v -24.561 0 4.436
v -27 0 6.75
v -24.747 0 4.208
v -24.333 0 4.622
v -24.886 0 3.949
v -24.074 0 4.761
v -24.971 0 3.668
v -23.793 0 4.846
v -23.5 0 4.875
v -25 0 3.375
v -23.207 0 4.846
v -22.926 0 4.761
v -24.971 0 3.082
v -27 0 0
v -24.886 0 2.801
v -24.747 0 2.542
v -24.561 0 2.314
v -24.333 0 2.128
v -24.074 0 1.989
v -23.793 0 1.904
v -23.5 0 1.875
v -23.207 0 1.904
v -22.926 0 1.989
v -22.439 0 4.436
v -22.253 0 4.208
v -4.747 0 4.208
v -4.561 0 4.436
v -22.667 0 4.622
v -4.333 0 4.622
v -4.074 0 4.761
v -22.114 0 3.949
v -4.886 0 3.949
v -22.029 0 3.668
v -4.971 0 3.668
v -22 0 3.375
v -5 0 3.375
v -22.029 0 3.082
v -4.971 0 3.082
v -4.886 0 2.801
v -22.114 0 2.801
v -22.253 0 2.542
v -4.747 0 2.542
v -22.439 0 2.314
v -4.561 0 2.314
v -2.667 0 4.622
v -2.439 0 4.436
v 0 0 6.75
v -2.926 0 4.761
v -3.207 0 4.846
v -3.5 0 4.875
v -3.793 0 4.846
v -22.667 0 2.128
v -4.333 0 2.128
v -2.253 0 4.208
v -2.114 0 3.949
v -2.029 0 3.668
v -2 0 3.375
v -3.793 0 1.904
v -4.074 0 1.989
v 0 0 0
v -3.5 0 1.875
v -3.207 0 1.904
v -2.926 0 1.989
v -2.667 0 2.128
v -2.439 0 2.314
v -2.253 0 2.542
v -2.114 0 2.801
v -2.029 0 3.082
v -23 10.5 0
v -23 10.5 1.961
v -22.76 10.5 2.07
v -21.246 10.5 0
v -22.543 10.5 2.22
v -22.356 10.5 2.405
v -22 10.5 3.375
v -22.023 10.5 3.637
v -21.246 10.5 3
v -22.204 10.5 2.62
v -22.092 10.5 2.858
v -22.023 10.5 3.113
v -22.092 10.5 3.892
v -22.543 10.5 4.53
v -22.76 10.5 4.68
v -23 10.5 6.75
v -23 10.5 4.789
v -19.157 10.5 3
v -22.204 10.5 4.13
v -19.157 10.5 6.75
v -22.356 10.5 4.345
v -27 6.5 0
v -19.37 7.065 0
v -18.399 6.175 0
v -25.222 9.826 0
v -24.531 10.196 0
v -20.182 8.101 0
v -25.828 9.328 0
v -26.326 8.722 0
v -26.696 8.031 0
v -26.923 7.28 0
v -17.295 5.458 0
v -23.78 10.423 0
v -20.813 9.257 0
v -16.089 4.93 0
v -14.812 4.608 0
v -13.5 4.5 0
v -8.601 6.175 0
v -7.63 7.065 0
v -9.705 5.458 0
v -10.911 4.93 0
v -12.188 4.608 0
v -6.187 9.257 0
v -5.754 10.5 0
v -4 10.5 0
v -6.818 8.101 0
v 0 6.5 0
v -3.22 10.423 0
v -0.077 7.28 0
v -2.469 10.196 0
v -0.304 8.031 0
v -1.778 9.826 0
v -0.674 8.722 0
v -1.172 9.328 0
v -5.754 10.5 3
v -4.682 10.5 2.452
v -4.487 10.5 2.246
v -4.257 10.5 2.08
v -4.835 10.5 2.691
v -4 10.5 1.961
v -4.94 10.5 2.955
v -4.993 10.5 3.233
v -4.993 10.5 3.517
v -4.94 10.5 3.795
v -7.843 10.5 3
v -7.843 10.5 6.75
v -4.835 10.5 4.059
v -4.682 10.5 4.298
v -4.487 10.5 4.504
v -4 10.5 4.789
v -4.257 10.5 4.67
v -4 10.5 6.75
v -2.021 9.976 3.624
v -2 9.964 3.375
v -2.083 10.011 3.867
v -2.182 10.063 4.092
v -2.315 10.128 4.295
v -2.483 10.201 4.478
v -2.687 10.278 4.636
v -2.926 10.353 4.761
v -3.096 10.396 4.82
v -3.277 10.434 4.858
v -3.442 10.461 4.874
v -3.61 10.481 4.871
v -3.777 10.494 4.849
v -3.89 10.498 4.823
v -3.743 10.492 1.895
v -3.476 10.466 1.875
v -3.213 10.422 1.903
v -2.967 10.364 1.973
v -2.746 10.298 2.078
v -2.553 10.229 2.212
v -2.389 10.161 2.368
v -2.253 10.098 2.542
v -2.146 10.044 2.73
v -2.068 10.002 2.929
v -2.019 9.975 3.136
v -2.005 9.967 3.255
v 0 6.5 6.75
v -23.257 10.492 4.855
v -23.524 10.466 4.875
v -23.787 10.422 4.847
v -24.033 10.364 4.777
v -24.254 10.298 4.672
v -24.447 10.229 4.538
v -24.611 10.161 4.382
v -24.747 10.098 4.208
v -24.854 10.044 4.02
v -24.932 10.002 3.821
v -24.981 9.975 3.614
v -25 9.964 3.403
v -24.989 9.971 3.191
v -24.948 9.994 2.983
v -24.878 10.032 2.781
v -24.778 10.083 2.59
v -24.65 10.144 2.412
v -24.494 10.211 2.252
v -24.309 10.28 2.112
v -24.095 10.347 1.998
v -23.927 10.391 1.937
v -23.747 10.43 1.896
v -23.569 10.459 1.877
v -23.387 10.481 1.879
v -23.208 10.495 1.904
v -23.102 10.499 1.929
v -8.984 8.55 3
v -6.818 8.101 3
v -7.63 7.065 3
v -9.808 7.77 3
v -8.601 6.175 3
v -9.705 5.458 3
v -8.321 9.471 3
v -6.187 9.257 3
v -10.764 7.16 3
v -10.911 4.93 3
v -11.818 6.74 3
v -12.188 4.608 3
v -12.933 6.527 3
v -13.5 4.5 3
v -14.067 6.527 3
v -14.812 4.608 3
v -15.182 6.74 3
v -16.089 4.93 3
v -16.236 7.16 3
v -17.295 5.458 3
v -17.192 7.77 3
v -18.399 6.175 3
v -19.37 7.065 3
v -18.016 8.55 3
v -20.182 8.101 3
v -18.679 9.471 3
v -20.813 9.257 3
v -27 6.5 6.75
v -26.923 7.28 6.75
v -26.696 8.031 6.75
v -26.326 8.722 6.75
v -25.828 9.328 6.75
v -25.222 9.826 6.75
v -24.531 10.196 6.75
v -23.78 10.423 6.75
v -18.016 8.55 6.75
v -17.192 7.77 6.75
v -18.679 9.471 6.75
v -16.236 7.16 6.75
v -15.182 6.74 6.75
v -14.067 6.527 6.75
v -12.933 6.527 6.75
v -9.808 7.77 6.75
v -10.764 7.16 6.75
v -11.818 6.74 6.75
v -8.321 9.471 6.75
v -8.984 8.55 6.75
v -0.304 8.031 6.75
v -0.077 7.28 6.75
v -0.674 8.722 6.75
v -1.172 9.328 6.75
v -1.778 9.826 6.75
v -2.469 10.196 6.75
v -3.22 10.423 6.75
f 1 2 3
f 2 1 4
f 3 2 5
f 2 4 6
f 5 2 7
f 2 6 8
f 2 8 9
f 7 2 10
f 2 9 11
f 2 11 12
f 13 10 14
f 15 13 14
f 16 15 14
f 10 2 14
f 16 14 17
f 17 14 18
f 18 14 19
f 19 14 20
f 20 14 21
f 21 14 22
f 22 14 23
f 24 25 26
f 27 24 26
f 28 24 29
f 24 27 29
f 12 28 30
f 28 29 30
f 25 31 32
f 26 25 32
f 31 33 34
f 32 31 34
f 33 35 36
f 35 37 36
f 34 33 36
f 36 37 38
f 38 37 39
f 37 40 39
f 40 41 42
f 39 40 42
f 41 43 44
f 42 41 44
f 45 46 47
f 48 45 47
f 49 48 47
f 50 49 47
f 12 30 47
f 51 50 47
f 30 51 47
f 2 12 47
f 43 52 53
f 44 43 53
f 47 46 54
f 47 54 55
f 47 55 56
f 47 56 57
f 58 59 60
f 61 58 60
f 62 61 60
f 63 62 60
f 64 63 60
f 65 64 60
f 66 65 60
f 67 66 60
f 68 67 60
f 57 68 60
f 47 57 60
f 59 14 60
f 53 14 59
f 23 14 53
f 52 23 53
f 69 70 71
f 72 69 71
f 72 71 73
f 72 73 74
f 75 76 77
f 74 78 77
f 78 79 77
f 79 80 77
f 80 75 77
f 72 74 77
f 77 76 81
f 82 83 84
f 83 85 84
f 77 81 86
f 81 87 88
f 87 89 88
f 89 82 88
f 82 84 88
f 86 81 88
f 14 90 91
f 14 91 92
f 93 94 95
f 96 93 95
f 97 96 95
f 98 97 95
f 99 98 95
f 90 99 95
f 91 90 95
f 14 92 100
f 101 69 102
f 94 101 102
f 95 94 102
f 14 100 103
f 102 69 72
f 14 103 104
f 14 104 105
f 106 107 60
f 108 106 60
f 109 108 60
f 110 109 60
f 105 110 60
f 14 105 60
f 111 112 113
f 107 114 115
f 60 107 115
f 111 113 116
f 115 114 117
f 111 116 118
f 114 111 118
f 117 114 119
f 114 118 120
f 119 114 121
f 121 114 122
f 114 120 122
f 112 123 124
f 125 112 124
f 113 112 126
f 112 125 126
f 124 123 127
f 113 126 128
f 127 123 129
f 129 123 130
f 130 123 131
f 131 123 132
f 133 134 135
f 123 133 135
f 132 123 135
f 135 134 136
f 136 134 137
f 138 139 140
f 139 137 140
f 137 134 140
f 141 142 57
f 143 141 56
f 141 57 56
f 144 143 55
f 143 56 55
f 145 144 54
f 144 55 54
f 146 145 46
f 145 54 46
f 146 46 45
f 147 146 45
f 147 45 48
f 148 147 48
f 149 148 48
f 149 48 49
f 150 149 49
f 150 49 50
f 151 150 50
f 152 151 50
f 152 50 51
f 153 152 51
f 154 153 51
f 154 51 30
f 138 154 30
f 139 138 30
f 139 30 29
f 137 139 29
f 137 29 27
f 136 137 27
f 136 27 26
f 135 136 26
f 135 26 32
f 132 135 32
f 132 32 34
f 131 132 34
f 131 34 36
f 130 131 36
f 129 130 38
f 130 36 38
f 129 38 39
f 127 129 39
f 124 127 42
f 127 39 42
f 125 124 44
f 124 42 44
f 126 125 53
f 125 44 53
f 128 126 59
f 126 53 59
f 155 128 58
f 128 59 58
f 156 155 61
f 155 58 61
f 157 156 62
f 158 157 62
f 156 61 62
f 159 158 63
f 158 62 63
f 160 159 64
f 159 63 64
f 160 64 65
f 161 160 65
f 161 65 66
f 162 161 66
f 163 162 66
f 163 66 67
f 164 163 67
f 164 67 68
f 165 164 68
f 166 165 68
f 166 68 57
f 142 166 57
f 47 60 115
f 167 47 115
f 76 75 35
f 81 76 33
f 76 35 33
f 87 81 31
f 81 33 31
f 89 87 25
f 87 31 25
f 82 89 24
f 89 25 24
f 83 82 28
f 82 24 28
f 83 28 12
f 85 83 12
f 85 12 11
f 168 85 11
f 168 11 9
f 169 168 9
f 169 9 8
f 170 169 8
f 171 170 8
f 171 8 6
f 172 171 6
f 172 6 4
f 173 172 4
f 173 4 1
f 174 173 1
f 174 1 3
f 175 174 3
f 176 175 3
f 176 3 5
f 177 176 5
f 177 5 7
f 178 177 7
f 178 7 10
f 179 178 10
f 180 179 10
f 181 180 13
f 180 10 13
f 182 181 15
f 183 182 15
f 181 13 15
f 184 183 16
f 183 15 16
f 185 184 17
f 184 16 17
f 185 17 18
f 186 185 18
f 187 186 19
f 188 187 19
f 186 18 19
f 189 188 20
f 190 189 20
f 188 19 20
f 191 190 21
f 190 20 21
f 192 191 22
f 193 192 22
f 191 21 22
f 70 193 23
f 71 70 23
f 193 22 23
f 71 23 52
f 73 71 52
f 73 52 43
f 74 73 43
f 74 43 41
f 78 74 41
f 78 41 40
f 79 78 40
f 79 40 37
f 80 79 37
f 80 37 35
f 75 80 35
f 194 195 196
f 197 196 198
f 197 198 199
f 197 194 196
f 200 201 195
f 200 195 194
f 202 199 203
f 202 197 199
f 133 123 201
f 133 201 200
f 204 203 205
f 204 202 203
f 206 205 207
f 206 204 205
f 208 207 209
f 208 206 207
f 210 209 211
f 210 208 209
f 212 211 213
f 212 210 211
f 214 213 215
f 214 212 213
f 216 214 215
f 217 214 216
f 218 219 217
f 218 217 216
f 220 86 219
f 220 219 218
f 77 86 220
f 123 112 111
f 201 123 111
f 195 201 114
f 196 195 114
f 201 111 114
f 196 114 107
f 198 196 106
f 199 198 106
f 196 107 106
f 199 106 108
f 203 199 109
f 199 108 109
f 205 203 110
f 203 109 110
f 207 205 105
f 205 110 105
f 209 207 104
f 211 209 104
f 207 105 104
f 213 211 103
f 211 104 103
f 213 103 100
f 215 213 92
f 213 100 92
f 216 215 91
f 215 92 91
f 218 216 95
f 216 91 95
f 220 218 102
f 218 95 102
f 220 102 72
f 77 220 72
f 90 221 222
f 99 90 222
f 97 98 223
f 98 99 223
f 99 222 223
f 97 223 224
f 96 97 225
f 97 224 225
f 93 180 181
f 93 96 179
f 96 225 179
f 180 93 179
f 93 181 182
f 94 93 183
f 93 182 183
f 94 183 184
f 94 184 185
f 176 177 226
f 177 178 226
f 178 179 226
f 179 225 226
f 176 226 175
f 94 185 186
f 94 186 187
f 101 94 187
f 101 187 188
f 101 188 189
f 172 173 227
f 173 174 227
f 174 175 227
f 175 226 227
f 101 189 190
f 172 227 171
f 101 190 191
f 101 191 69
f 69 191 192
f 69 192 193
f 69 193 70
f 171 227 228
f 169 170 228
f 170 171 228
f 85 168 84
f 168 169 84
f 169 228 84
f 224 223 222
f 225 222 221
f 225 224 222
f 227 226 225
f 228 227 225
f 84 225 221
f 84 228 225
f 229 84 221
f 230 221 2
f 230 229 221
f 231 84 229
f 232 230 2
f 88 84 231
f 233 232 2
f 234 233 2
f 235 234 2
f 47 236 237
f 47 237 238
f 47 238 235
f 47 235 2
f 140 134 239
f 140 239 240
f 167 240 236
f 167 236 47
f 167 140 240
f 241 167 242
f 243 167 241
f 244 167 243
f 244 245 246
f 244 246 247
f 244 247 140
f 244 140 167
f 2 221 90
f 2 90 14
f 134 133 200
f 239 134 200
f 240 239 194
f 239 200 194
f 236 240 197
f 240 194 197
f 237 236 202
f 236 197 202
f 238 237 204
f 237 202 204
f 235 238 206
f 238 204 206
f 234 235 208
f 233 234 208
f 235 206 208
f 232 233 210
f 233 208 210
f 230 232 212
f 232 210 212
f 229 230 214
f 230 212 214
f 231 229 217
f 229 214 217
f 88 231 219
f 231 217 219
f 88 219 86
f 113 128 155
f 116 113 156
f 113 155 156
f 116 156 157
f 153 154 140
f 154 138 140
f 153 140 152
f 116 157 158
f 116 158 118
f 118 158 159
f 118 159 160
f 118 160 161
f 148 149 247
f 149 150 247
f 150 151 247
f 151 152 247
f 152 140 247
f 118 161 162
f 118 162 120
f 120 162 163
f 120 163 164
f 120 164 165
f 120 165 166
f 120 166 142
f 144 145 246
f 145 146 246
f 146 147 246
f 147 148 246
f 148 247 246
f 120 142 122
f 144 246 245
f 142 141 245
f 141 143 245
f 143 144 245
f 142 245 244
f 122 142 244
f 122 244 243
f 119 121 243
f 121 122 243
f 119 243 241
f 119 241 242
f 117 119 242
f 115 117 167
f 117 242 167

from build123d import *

# Parameters (mm, degrees)
BOSS_EXTRUDE1_DEPTH = 6.75
SKETCH3_R           = 8
CUT_EXTRUDE2_DEPTH  = 3
SKETCH4_W           = 27
SKETCH4_H           = 2
CUT_EXTRUDE3_DEPTH  = 9
SKETCH5_R           = 1.5
CUT_EXTRUDE4_DEPTH  = 16
FILLET1_R           = 4


with BuildPart() as part:
    # Sketch1 → Boss-Extrude1 (new body)
    with BuildSketch(Plane.XY):
        with BuildLine():
            Line((-27, 0), (0, 0))
            Line((0, 0), (0, 12.5))
            Line((0, 12.5), (-7.5, 12.5))
            ThreePointArc((-7.5, 12.5), (-13.5, 6.5), (-19.5, 12.5))
            Line((-19.5, 12.5), (-27, 12.5))
            Line((-27, 12.5), (-27, 0))
        make_face()
    extrude(amount=BOSS_EXTRUDE1_DEPTH)

    # Sketch3 → Cut-Extrude2 (cut)
    with BuildSketch(Plane(origin=(0, 0, 0), x_dir=(-1, 0, 0), z_dir=(0, 0, -1))):
        with Locations((13.5, 12.5)):
            Circle(SKETCH3_R)
    extrude(amount=-CUT_EXTRUDE2_DEPTH, mode=Mode.SUBTRACT)

    # Sketch4 → Cut-Extrude3 (cut)
    with BuildSketch(Plane.XY.offset(6.75)):
        with Locations((-13.5, 11.5)):
            Rectangle(SKETCH4_W, SKETCH4_H)
    extrude(amount=-CUT_EXTRUDE3_DEPTH, mode=Mode.SUBTRACT)

    # Sketch5 → Cut-Extrude4 (cut)
    with BuildSketch(Plane.XZ):
        with Locations((-23.5, 3.375)):
            Circle(SKETCH5_R)
        with Locations((-3.5, 3.375)):
            Circle(SKETCH5_R)
    extrude(amount=-CUT_EXTRUDE4_DEPTH, mode=Mode.SUBTRACT)

    # Fillet1
    # the kernel refuses this fillet: 4 mm, written as the material it takes off along each edge
    with BuildSketch(Plane(origin=(-27, 10.5, 16.75), x_dir=(1, 0, 0), z_dir=(0, 0, -1))) as fillet1_piece_1:
        with BuildLine():
            CenterArc((FILLET1_R, FILLET1_R), FILLET1_R, 180, 90)
            Line((0, FILLET1_R), (0, 0))
            Line((0, 0), (FILLET1_R, 0))
        make_face()
    extrude(amount=26.75, mode=Mode.SUBTRACT)
    with BuildSketch(Plane(origin=(0, 10.5, 16.75), x_dir=(-1, 0, 0), z_dir=(0, 0, -1))) as fillet1_piece_2:
        with BuildLine():
            CenterArc((FILLET1_R, -FILLET1_R), FILLET1_R, 90, 90)
            Line((0, -FILLET1_R), (0, 0))
            Line((0, 0), (FILLET1_R, 0))
        make_face()
    extrude(amount=26.75, mode=Mode.SUBTRACT)


solid = part.part
